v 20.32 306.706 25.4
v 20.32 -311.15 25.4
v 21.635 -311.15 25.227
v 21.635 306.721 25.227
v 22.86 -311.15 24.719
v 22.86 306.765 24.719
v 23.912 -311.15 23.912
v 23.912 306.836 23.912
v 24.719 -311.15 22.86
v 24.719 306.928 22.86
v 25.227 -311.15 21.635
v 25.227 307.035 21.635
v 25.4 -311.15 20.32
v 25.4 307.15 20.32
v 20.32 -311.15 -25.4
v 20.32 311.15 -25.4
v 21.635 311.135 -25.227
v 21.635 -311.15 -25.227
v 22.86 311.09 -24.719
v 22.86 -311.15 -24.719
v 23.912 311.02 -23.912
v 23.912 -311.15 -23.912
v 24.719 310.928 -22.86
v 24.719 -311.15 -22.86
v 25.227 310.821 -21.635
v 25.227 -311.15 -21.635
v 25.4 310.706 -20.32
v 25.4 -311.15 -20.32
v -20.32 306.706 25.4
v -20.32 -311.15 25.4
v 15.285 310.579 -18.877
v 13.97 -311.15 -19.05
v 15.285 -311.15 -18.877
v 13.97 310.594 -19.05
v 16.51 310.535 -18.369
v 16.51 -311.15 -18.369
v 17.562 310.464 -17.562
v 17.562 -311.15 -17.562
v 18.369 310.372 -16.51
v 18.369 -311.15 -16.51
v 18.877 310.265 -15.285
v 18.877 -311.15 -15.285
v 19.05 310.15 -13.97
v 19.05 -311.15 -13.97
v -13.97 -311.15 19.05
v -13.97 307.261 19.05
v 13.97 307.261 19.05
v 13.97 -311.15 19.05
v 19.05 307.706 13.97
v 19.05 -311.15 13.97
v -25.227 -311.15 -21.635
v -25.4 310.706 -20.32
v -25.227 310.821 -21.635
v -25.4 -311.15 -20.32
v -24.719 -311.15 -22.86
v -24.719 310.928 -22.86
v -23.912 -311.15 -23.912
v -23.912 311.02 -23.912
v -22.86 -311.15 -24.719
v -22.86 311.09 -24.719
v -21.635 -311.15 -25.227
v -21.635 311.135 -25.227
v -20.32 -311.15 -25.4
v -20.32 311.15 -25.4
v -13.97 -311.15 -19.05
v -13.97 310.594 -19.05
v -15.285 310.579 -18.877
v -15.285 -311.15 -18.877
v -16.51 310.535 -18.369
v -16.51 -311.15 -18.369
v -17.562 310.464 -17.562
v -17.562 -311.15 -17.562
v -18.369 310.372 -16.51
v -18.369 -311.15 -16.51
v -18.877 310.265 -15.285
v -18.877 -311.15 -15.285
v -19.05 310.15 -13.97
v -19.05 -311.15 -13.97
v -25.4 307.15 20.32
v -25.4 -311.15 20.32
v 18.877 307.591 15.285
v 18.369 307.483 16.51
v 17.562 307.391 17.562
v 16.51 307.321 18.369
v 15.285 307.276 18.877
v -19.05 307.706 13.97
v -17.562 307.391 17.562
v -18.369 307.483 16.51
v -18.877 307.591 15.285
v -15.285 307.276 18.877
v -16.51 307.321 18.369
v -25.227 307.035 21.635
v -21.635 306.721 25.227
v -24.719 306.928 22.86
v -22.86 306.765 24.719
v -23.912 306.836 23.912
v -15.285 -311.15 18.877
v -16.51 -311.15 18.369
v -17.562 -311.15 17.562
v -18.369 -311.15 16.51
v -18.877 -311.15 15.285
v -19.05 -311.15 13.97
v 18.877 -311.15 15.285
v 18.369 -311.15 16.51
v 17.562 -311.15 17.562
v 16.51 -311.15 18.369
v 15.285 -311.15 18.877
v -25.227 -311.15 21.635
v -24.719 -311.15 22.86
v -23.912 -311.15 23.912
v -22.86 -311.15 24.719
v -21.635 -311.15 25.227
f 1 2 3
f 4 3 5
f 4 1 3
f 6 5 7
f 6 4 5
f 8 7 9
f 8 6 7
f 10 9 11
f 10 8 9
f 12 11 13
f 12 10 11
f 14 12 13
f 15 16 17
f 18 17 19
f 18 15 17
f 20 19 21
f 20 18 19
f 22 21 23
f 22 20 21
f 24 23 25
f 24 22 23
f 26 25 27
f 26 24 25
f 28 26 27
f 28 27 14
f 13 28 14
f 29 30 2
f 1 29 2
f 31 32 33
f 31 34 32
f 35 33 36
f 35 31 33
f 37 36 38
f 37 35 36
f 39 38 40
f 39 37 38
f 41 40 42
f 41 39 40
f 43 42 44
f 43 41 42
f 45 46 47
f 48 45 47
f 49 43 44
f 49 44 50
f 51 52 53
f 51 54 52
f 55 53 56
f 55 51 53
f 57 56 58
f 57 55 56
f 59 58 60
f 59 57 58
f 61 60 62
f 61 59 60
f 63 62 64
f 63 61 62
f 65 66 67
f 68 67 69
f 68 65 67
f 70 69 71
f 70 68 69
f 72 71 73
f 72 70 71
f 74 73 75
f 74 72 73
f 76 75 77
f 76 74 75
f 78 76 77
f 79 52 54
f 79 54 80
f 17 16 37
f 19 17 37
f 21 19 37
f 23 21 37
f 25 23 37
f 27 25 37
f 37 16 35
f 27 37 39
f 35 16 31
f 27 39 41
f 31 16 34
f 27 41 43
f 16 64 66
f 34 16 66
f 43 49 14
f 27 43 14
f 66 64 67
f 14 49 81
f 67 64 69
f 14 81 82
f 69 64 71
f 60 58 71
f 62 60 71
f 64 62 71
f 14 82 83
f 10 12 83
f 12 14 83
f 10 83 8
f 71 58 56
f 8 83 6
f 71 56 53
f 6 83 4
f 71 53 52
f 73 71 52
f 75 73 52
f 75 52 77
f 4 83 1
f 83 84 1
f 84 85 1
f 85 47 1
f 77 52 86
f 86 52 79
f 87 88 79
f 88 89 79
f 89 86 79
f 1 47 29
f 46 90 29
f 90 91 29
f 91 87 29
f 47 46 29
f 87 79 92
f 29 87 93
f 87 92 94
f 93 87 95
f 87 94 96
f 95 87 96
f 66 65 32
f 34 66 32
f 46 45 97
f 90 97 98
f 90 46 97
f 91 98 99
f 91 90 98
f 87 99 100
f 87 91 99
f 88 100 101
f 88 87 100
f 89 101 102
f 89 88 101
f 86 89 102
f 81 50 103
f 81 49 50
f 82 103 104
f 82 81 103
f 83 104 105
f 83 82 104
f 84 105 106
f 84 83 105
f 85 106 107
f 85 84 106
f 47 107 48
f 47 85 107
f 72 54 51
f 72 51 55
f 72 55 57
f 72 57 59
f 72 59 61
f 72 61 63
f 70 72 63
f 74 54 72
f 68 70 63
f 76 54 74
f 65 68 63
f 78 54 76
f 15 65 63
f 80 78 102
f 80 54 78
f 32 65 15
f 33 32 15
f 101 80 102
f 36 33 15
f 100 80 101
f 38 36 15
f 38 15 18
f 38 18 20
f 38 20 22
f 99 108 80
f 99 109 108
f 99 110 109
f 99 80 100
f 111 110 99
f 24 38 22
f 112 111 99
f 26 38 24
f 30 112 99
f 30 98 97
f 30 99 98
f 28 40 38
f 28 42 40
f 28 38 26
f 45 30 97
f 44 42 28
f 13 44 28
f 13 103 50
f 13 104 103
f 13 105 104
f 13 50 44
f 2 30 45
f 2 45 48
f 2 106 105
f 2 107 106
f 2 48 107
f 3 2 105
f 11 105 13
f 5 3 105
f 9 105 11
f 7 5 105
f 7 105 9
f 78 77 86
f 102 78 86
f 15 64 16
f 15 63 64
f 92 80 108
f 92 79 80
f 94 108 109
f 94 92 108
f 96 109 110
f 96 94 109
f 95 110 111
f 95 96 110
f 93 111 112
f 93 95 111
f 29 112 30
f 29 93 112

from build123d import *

# Parameters (mm, degrees)
F0_W     = 50.8
F0_H     = 50.8
F0_W_2   = 38.1
F0_H_2   = 38.1
F1_DEPTH = 311.15
F3_DEPTH = 50.8
F4_R     = 5.08


with BuildPart() as f1:
    # F0 (on Front) → F1 (new body, symmetric)
    with BuildSketch(Plane.XZ):
        Rectangle(F0_W, F0_H)
        Rectangle(F0_W_2, F0_H_2, mode=Mode.SUBTRACT)
    extrude(amount=F1_DEPTH, both=True)

    # F2 (on face) → F3 (cut)
    with BuildSketch(Plane(origin=(-25.4, 0, 0), x_dir=(0, -1, 0), z_dir=(-1, 0, 0))):
        Polygon((-306.705576, 25.4), (-311.15, 25.4), (-311.15, -25.4), align=None)
    extrude(amount=-F3_DEPTH, mode=Mode.SUBTRACT)

    # F4
    f4_edges = [f1.edges().sort_by_distance(p)[0] for p in [
        (25.4, -2.222212, 25.4),
        (-25.4, -2.222212, 25.4),
        (25.4, 0, -25.4),
        (-25.4, 0, -25.4),
        (19.05, -1.944436, 19.05),
        (-19.05, -1.944436, 19.05),
        (19.05, -0.277777, -19.05),
        (-19.05, -0.277777, -19.05),
    ]]
    fillet(f4_edges, radius=F4_R)


solid = f1.part
